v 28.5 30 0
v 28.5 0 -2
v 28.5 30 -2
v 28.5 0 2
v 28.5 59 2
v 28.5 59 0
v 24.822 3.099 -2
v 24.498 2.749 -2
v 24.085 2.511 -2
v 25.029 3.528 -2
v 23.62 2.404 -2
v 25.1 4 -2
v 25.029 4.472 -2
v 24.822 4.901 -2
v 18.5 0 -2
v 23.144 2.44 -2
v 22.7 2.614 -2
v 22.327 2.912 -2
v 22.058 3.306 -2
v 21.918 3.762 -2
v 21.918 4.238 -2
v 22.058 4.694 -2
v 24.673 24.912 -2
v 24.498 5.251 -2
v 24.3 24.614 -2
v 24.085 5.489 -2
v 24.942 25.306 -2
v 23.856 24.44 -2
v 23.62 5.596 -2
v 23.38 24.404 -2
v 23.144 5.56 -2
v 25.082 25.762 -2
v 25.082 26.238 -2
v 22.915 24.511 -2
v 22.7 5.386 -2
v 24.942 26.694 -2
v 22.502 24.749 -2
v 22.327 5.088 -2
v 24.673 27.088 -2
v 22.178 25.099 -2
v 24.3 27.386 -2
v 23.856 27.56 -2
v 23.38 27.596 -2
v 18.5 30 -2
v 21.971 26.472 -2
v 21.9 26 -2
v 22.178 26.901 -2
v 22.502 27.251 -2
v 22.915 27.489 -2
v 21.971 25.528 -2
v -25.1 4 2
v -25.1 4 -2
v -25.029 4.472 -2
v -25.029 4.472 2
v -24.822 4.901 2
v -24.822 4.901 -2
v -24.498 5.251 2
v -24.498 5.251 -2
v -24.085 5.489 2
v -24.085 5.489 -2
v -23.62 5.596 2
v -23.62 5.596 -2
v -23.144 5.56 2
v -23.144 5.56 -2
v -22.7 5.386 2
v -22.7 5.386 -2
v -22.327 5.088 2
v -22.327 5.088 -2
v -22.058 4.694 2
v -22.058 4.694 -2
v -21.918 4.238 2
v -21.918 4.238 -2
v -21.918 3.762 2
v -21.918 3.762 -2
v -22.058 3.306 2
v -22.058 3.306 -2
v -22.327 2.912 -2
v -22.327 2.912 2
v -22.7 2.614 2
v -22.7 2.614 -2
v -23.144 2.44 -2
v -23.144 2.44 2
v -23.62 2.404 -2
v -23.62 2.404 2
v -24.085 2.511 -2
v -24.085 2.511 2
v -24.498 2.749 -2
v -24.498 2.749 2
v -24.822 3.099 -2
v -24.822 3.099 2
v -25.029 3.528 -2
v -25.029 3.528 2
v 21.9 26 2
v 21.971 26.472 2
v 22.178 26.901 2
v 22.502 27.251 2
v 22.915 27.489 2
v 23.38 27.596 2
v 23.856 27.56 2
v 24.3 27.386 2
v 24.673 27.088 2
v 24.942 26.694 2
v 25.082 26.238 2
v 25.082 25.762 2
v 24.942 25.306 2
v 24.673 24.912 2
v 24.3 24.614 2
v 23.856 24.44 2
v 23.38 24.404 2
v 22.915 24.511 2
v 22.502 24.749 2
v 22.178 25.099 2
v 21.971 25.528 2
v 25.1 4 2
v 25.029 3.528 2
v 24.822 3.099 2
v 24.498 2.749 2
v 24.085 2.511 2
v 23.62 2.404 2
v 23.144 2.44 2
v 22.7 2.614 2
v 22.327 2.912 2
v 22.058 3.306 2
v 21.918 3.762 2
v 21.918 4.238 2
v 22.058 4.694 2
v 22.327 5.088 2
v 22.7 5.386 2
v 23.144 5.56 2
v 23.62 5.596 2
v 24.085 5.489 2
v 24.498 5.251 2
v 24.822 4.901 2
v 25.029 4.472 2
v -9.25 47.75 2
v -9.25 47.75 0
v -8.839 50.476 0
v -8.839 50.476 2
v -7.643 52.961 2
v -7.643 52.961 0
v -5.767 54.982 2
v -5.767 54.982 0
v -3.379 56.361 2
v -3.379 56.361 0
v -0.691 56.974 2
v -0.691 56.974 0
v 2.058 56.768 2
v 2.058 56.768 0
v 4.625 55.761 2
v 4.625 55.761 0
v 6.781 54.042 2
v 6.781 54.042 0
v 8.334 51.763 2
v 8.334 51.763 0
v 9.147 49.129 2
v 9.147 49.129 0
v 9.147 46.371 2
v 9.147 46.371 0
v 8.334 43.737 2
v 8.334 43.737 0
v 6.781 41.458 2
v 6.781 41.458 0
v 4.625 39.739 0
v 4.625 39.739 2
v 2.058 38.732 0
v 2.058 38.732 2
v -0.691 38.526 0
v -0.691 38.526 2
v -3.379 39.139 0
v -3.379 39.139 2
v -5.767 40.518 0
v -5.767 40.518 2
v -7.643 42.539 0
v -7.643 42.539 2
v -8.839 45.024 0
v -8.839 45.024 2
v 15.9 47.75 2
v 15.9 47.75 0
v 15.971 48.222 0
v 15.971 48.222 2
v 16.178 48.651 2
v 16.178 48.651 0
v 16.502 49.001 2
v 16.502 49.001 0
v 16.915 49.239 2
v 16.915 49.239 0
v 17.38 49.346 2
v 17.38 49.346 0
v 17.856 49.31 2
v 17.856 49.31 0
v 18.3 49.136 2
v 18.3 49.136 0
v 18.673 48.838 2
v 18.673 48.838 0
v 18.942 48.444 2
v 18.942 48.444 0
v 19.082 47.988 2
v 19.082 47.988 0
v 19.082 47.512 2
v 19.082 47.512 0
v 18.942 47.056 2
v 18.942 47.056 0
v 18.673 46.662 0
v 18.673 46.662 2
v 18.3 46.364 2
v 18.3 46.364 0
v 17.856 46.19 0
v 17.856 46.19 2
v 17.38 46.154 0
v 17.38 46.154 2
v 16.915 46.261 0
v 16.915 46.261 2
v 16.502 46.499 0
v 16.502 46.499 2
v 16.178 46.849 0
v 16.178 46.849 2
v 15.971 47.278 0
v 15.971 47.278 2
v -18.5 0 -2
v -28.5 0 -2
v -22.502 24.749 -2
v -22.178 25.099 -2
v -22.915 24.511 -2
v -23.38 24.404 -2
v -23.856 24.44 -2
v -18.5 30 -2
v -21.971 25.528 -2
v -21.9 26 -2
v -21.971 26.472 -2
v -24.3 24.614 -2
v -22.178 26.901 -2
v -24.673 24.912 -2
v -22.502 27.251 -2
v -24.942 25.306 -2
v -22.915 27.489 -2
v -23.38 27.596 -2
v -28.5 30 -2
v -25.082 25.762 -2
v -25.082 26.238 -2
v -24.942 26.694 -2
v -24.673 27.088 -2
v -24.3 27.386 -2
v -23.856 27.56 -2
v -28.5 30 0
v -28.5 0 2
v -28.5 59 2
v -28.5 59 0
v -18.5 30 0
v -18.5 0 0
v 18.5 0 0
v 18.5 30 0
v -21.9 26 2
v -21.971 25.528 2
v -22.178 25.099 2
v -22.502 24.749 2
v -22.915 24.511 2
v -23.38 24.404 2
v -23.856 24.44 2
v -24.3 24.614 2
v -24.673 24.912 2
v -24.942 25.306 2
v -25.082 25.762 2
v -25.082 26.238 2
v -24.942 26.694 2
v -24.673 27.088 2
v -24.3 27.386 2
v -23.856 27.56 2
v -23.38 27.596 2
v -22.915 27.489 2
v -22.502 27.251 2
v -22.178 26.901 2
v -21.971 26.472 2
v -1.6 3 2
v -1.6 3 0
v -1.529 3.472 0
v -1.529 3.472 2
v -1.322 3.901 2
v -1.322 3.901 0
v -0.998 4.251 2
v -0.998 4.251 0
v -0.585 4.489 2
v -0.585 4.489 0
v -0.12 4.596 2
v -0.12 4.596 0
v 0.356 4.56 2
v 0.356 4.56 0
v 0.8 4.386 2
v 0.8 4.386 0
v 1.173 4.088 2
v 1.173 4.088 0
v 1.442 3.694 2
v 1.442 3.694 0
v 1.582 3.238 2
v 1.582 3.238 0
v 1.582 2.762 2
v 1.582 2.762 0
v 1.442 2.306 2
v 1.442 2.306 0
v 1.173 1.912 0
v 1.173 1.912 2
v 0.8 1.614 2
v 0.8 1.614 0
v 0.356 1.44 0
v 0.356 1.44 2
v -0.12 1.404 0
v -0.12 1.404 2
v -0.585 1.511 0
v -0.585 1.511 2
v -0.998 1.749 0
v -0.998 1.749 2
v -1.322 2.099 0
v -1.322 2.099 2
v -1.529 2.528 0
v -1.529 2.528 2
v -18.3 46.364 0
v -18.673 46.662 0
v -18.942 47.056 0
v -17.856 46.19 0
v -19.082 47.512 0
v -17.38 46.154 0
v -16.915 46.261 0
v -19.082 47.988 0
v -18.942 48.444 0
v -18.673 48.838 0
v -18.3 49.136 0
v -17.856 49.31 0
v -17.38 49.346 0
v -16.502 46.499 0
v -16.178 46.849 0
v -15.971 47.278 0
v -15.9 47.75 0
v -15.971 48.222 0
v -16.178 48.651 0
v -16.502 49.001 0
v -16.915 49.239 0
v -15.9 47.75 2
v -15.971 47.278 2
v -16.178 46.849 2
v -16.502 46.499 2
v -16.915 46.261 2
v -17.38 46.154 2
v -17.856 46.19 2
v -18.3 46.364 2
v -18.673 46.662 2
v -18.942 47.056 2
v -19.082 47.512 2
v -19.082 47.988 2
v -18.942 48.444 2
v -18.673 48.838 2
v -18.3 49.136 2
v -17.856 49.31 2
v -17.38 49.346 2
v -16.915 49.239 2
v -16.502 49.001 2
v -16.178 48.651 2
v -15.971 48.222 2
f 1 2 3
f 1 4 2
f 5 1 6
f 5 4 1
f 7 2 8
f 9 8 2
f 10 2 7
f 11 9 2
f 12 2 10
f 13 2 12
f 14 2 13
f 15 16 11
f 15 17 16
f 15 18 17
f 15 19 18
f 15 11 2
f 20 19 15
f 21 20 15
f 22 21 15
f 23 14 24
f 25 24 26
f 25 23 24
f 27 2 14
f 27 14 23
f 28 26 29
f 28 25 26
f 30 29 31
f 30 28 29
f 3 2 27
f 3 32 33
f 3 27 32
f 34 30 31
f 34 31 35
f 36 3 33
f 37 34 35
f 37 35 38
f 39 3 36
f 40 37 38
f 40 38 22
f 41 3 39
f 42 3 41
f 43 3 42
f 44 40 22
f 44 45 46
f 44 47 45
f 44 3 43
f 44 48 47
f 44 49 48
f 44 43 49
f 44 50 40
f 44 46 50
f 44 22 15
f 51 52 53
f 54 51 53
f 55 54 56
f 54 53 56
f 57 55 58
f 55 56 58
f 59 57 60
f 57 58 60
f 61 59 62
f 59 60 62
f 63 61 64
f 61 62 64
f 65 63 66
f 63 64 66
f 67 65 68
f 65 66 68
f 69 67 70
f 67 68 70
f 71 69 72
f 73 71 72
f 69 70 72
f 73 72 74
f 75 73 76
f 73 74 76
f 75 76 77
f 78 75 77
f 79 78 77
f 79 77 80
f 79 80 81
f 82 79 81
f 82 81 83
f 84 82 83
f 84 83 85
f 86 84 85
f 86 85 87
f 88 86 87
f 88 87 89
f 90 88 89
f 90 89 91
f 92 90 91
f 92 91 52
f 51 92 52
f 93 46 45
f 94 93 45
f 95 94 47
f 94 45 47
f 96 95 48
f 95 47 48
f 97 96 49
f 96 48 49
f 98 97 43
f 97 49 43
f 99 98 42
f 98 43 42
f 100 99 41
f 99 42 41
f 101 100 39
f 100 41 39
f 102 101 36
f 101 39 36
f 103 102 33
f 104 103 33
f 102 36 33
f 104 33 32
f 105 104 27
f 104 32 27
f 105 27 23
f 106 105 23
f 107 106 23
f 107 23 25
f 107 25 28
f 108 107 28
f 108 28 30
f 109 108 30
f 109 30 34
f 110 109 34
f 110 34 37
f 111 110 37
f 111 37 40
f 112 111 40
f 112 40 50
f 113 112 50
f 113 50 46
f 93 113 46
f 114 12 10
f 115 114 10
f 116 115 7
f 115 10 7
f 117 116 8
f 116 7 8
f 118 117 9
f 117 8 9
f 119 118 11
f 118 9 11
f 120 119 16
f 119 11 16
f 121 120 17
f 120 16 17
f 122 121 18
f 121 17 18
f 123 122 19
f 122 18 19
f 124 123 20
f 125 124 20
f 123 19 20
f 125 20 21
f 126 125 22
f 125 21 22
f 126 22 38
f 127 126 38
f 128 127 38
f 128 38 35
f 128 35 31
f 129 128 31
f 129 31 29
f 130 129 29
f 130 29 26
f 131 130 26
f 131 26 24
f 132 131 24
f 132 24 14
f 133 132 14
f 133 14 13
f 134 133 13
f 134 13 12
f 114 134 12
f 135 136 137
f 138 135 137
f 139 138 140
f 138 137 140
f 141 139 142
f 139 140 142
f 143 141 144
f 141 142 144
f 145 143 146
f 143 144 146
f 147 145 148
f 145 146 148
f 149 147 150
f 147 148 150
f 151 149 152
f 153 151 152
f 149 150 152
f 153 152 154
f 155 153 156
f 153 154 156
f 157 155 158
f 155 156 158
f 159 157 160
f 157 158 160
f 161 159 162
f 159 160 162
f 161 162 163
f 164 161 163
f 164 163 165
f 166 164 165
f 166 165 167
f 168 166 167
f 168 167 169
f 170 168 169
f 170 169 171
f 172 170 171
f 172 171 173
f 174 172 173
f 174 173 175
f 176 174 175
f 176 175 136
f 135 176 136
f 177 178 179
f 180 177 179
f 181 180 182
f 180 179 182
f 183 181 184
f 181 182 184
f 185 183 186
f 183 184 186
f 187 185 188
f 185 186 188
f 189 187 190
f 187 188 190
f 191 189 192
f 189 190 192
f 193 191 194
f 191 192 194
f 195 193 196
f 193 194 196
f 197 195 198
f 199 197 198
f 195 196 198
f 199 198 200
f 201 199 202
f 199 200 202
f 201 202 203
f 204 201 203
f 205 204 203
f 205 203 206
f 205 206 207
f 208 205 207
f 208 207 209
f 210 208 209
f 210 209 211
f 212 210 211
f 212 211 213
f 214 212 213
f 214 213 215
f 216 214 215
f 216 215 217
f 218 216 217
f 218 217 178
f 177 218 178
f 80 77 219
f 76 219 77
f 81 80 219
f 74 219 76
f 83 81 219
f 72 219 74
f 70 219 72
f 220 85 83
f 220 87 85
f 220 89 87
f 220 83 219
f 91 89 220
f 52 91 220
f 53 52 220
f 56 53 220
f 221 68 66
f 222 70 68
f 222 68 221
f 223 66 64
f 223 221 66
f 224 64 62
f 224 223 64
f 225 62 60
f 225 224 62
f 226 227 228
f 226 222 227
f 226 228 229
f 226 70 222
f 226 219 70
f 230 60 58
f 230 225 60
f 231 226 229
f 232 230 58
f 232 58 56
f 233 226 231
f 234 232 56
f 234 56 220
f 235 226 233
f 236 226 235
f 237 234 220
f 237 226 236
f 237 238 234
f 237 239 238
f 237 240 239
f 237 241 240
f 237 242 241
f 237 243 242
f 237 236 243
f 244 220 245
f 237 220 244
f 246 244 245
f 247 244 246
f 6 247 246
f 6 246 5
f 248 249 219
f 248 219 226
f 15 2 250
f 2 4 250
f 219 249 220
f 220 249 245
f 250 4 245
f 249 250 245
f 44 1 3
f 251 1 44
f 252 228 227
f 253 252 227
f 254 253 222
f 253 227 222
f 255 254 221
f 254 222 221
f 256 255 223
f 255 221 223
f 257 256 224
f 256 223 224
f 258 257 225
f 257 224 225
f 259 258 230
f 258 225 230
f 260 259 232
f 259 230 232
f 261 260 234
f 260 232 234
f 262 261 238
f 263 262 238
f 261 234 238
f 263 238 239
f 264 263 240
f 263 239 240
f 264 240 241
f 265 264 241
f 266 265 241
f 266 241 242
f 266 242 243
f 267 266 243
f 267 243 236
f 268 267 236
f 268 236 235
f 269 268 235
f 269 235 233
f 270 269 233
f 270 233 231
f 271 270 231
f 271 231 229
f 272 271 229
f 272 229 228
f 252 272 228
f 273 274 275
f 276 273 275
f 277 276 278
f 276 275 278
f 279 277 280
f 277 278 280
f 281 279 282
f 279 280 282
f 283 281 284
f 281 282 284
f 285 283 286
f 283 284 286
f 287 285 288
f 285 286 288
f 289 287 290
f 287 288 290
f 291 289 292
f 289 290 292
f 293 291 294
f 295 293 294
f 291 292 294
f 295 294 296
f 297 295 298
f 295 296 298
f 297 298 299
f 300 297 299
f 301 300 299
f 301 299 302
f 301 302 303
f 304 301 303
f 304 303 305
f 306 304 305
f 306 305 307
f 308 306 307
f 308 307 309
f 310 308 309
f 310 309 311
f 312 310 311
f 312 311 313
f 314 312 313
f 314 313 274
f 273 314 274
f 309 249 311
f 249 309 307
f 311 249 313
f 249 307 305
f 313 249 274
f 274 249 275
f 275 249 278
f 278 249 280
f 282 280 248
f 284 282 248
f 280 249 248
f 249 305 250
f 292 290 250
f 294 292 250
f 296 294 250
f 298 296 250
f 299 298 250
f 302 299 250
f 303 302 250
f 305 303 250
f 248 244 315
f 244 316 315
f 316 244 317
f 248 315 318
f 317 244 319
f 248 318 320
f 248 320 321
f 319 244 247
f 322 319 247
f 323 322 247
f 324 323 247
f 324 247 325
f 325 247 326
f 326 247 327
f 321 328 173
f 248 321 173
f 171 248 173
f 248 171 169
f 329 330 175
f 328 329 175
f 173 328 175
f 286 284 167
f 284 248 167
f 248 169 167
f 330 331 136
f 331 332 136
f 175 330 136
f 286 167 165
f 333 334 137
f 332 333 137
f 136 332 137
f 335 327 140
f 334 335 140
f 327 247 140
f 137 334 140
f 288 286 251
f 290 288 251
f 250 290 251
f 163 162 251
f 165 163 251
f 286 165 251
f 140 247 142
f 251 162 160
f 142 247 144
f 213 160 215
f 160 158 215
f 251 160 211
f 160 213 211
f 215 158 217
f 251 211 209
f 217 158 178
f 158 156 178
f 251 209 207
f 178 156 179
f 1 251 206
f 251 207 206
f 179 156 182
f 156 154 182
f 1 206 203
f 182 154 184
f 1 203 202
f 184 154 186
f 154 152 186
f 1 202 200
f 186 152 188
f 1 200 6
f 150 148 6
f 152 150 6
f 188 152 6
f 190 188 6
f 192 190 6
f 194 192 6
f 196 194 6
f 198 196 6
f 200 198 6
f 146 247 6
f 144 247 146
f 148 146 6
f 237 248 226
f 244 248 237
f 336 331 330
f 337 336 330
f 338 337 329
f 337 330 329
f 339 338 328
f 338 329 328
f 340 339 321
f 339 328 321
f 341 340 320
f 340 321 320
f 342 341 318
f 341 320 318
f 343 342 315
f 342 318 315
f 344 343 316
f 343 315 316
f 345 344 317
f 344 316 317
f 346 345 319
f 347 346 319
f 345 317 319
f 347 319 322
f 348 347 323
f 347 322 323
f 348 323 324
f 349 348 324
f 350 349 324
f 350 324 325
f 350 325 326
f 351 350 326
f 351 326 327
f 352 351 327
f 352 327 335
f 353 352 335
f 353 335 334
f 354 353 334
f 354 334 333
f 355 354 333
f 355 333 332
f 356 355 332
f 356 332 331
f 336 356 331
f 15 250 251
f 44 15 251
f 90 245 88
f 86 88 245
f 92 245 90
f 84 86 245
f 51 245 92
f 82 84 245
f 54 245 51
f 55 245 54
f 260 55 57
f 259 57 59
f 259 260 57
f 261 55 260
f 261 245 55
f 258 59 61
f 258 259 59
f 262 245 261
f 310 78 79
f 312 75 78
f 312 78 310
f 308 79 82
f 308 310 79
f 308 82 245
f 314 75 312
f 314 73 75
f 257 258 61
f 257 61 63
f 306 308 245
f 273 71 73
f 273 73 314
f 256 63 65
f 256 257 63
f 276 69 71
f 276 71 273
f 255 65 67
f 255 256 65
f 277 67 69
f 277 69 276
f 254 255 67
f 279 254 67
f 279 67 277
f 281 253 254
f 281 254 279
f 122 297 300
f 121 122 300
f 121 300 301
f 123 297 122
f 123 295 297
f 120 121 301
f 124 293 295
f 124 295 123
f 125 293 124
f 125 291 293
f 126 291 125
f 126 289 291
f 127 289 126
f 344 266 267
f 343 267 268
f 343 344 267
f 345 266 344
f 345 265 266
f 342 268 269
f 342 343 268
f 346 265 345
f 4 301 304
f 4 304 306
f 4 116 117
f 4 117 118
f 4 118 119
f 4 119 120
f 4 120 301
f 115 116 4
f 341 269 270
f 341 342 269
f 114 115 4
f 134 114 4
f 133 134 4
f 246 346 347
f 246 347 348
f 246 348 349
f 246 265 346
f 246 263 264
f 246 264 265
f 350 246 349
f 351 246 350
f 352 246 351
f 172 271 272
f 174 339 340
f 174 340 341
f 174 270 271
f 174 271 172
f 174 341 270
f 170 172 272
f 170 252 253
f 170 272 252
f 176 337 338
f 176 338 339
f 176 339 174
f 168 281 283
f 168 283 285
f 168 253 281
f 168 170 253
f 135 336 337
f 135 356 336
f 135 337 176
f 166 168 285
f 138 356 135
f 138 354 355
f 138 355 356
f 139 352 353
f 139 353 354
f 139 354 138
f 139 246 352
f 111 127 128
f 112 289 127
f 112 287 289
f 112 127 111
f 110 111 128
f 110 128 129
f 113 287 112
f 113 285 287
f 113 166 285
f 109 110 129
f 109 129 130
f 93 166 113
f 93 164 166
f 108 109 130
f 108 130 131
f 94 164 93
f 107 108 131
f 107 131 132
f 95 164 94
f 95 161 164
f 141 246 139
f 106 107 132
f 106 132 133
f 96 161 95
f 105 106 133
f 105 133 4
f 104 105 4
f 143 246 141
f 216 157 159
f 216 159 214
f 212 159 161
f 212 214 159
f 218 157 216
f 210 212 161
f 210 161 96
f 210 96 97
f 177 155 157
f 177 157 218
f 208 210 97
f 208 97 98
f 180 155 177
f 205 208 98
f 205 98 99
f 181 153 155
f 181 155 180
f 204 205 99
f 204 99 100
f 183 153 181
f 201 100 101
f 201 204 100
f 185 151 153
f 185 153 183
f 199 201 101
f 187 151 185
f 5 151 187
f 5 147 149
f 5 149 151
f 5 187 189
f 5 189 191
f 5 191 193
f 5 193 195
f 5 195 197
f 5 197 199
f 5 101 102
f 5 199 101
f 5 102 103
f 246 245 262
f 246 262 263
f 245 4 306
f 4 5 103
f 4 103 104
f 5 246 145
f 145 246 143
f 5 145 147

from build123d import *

# Parameters (mm, degrees)
SKIZZE1_W                      = 57
SKIZZE1_H                      = 59
GRUNDK_RPER_DEPTH              = 2
SKIZZE2_R                      = 9.25
SKIZZE2_R_2                    = 1.6
BOHRUNGEN_KUGELROLLER_DEPTH    = 66.553413336
SKIZZE3_W                      = 10
SKIZZE3_H                      = 30
AUFSATZ_GETRIEBEHALTER_DEPTH   = 2
SKIZZE4_R                      = 1.6
BOHRUNGEN_GETRIEBEHALTER_DEPTH = 66.644877942
SKIZZE5_R                      = 1.6
BOHRUNG_HALTERUNG_DEPTH        = 66.553413336


with BuildPart() as part:
    # Skizze1 → Grundkörper (new body)
    with BuildSketch(Plane.XY):
        with Locations((0, 29.5)):
            Rectangle(SKIZZE1_W, SKIZZE1_H)
    extrude(amount=GRUNDK_RPER_DEPTH)

    # Skizze2 → Bohrungen_Kugelroller (cut, through all)
    with BuildSketch(Plane(origin=(0, 0, 0), x_dir=(-1, 0, 0), z_dir=(0, 0, -1))):
        with Locations((0, 47.75)):
            Circle(SKIZZE2_R)
        with Locations((-17.5, 47.75)):
            Circle(SKIZZE2_R_2)
        with Locations(Location((17.5, 47.75, 0), (0, 0, 180))):
            Circle(SKIZZE2_R_2)
    extrude(amount=-BOHRUNGEN_KUGELROLLER_DEPTH, mode=Mode.SUBTRACT)

    # Skizze3 → Aufsatz_Getriebehalter (add)
    with BuildSketch(Plane(origin=(0, 0, 0), x_dir=(-1, 0, 0), z_dir=(0, 0, -1))):
        with Locations((-23.5, 15)):
            Rectangle(SKIZZE3_W, SKIZZE3_H)
        with Locations((23.5, 15)):
            Rectangle(SKIZZE3_W, SKIZZE3_H)
    extrude(amount=AUFSATZ_GETRIEBEHALTER_DEPTH)

    # Skizze4 → Bohrungen_Getriebehalter (cut, through all)
    with BuildSketch(Plane(origin=(0, 0, -2), x_dir=(-1, 0, 0), z_dir=(0, 0, -1))):
        with Locations((-23.5, 26)):
            Circle(SKIZZE4_R)
        with Locations(Location((23.5, 26, 0), (0, 0, 180))):
            Circle(SKIZZE4_R)
        with Locations((23.5, 4)):
            Circle(SKIZZE4_R)
        with Locations(Location((-23.5, 4, 0), (0, 0, 180))):
            Circle(SKIZZE4_R)
    extrude(amount=-BOHRUNGEN_GETRIEBEHALTER_DEPTH, mode=Mode.SUBTRACT)

    # Skizze5 → Bohrung_Halterung (cut, through all)
    with BuildSketch(Plane(origin=(0, 0, 0), x_dir=(-1, 0, 0), z_dir=(0, 0, -1))):
        with Locations((0, 3)):
            Circle(SKIZZE5_R)
    extrude(amount=-BOHRUNG_HALTERUNG_DEPTH, mode=Mode.SUBTRACT)


solid = part.part
